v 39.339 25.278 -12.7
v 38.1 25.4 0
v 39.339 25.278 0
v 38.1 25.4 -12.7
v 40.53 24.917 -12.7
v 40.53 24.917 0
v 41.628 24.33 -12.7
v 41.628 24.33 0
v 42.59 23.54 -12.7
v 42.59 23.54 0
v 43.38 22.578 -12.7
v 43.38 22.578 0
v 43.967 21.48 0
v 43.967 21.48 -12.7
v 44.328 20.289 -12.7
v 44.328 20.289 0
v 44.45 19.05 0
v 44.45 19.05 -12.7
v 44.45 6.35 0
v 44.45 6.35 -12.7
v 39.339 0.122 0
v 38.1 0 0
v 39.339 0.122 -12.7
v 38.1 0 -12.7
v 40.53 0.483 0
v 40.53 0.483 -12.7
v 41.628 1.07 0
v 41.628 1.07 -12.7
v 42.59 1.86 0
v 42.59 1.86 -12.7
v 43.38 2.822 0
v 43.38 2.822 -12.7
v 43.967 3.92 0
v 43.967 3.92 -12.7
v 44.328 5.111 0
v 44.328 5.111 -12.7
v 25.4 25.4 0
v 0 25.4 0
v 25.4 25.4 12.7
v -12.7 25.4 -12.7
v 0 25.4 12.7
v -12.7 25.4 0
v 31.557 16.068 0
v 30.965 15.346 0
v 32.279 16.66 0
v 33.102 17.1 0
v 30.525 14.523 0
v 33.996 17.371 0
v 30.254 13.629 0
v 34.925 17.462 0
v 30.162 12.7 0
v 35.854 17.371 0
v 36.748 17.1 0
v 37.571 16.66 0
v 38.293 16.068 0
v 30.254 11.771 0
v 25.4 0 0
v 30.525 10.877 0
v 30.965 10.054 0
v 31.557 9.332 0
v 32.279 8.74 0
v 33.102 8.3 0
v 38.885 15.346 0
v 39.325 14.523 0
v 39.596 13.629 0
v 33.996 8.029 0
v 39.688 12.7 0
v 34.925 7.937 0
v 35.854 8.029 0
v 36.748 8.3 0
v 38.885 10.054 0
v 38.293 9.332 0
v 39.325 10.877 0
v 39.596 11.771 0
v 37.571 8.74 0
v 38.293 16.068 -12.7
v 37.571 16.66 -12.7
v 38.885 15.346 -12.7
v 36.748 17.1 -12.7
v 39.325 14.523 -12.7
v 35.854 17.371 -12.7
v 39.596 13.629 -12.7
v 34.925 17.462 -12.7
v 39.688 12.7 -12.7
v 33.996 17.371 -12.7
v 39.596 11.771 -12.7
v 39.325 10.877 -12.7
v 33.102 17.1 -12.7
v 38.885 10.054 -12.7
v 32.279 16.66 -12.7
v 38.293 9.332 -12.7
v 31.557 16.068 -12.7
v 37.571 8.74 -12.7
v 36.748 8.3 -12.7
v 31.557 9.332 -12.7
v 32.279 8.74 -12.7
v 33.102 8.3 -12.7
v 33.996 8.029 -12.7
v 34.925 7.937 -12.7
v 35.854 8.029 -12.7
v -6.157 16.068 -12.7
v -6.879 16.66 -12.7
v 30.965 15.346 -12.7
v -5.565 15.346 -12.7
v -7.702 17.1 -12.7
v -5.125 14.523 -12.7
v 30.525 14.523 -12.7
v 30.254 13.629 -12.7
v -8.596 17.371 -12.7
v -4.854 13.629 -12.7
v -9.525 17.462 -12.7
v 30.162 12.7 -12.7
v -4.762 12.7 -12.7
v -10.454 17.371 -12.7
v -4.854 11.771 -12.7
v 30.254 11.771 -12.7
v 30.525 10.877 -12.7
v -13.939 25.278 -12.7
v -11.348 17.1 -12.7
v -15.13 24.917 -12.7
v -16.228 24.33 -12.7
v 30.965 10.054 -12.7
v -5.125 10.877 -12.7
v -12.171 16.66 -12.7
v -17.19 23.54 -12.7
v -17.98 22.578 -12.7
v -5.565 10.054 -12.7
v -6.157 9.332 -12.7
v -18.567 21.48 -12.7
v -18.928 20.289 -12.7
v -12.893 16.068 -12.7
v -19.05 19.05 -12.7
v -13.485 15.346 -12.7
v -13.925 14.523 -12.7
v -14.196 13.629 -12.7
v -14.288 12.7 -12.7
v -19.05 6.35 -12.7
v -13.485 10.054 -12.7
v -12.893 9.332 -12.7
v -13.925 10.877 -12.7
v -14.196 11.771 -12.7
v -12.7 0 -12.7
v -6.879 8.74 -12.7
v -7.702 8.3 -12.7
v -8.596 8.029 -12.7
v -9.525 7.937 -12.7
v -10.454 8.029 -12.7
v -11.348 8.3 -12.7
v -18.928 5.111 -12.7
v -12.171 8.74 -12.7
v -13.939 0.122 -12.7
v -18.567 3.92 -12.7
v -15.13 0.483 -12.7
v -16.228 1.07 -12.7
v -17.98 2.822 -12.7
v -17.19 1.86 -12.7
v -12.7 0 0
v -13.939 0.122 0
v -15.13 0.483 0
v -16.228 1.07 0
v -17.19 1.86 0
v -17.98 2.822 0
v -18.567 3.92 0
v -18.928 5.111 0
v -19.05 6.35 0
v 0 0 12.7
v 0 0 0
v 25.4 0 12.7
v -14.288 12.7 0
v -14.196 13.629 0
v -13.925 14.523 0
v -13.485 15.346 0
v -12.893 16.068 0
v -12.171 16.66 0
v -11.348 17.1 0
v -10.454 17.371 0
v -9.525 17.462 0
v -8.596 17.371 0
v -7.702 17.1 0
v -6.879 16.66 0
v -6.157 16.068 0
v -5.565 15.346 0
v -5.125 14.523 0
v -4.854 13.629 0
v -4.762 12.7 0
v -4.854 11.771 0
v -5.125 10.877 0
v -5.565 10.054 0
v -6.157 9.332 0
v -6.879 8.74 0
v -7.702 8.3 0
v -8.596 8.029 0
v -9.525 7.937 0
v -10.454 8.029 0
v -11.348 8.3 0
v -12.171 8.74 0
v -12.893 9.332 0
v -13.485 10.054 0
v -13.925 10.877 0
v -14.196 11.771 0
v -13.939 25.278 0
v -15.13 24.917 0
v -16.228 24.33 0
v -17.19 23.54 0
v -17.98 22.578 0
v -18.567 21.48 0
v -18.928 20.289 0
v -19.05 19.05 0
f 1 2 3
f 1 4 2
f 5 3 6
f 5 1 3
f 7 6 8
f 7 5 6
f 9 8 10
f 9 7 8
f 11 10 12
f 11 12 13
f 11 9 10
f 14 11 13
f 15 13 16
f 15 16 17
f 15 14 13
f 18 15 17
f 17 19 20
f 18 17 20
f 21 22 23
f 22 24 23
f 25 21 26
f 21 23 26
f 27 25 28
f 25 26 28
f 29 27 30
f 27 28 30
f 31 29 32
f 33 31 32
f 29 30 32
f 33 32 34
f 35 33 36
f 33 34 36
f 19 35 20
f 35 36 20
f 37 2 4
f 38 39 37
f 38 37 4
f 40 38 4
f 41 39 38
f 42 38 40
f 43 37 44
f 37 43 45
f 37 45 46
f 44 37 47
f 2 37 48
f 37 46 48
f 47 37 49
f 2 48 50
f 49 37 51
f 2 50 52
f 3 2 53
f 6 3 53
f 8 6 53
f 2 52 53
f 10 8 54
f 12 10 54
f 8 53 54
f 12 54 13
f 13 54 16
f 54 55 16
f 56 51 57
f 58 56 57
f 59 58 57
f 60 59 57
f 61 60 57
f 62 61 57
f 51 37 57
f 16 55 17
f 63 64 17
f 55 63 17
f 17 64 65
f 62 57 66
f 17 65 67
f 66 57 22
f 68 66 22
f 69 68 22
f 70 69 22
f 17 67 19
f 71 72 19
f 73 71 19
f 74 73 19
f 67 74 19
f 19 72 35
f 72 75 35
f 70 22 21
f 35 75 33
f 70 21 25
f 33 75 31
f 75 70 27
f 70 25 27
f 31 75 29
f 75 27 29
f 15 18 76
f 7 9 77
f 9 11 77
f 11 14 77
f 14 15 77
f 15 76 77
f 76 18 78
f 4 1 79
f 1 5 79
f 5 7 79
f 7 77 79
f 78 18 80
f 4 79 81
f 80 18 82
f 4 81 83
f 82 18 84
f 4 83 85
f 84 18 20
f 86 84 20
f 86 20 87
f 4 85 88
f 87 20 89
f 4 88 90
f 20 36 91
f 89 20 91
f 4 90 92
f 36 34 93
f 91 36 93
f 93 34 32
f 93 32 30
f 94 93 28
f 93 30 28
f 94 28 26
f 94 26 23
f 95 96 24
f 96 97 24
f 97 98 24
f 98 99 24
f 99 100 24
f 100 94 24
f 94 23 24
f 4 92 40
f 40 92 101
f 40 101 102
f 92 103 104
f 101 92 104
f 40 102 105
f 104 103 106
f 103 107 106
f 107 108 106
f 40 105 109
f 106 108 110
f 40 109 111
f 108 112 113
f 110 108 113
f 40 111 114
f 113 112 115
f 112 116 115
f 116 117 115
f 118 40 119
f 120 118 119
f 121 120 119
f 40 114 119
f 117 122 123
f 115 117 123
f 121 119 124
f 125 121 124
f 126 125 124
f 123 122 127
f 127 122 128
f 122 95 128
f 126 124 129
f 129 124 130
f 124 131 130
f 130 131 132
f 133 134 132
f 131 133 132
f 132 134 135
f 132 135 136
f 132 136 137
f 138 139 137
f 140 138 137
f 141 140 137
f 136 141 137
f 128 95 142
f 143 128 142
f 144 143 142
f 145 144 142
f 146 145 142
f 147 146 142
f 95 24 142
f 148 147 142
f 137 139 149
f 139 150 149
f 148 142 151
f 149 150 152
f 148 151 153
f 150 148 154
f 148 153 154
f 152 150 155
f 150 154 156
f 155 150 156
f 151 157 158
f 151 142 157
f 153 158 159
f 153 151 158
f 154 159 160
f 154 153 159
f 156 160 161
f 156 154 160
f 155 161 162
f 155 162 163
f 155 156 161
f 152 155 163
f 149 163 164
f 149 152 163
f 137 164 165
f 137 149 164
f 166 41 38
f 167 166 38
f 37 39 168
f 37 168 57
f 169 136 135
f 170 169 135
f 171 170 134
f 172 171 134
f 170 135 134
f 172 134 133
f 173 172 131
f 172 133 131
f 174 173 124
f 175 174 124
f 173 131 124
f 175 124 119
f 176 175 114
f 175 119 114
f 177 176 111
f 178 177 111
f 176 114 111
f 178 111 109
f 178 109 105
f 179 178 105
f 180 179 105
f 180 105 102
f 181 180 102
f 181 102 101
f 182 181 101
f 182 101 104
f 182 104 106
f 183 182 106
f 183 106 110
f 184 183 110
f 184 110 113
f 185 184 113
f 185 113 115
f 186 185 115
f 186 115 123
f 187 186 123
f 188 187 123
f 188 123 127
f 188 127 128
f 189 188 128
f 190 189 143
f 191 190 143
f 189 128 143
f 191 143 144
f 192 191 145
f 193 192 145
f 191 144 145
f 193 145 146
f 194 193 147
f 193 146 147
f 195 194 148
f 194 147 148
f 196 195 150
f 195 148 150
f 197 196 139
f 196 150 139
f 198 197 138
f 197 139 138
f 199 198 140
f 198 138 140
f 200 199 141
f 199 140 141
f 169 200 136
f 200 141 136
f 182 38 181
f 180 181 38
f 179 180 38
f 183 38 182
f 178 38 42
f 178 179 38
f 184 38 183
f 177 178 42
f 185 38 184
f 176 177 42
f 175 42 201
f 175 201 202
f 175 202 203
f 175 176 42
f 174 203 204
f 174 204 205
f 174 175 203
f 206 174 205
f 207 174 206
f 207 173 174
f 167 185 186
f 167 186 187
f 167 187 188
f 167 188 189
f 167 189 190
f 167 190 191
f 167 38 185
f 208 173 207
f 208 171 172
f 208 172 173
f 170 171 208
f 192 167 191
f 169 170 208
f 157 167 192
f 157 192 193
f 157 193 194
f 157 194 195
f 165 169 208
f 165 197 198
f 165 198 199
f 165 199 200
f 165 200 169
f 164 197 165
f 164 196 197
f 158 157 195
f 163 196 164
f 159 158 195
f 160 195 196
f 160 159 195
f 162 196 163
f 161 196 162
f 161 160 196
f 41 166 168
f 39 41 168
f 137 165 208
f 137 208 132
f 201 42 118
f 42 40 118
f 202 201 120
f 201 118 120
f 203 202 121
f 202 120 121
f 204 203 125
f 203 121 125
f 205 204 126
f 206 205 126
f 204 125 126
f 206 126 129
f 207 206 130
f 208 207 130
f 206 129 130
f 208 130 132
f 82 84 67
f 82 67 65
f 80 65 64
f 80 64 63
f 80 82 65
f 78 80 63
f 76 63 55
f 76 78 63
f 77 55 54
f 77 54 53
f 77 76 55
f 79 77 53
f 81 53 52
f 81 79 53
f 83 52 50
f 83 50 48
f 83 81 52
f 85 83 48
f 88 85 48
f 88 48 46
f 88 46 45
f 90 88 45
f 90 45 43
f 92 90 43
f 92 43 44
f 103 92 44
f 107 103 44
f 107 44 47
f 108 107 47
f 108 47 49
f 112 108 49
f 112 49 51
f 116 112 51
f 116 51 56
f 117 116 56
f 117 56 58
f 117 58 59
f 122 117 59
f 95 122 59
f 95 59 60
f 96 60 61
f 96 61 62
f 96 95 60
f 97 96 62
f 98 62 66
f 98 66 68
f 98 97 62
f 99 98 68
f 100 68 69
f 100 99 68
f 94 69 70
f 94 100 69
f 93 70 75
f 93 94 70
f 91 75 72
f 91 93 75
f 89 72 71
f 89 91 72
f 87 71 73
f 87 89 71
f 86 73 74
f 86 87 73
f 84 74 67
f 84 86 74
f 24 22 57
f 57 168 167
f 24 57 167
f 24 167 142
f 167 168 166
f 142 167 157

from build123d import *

# Parameters (mm, degrees)
F1_DEPTH = 25.4
F3_D     = 9.525
F4_R     = 6.35


with BuildPart() as f1:
    # F0 (on Front) → F1 (new body)
    with BuildSketch(Plane.XZ):
        Polygon((0, 0), (-19.05, 0), (-19.05, -12.7), (12.7, -12.7), (12.7, 0), (12.7, 12.7), (0, 12.7), align=None)
    extrude(amount=-F1_DEPTH)

    # F3 (through all)
    with Locations(Plane.XY):
        with Locations((-9.525, 12.7)):
            Hole(F3_D / 2)

    # F4
    f4_edges = [f1.edges().sort_by_distance(p)[0] for p in [
        (-19.05, 25.4, -6.35),
        (-19.05, 0, -6.35),
    ]]
    fillet(f4_edges, radius=F4_R)

    # F5: F1 across face


with BuildPart() as f1_1:
    add(f1.part)
    add(f1.part.mirror(Plane(origin=(12.7, 12.7, 0), x_dir=(0, 1, 0), z_dir=(1, 0, 0))))


solid = f1_1.part
